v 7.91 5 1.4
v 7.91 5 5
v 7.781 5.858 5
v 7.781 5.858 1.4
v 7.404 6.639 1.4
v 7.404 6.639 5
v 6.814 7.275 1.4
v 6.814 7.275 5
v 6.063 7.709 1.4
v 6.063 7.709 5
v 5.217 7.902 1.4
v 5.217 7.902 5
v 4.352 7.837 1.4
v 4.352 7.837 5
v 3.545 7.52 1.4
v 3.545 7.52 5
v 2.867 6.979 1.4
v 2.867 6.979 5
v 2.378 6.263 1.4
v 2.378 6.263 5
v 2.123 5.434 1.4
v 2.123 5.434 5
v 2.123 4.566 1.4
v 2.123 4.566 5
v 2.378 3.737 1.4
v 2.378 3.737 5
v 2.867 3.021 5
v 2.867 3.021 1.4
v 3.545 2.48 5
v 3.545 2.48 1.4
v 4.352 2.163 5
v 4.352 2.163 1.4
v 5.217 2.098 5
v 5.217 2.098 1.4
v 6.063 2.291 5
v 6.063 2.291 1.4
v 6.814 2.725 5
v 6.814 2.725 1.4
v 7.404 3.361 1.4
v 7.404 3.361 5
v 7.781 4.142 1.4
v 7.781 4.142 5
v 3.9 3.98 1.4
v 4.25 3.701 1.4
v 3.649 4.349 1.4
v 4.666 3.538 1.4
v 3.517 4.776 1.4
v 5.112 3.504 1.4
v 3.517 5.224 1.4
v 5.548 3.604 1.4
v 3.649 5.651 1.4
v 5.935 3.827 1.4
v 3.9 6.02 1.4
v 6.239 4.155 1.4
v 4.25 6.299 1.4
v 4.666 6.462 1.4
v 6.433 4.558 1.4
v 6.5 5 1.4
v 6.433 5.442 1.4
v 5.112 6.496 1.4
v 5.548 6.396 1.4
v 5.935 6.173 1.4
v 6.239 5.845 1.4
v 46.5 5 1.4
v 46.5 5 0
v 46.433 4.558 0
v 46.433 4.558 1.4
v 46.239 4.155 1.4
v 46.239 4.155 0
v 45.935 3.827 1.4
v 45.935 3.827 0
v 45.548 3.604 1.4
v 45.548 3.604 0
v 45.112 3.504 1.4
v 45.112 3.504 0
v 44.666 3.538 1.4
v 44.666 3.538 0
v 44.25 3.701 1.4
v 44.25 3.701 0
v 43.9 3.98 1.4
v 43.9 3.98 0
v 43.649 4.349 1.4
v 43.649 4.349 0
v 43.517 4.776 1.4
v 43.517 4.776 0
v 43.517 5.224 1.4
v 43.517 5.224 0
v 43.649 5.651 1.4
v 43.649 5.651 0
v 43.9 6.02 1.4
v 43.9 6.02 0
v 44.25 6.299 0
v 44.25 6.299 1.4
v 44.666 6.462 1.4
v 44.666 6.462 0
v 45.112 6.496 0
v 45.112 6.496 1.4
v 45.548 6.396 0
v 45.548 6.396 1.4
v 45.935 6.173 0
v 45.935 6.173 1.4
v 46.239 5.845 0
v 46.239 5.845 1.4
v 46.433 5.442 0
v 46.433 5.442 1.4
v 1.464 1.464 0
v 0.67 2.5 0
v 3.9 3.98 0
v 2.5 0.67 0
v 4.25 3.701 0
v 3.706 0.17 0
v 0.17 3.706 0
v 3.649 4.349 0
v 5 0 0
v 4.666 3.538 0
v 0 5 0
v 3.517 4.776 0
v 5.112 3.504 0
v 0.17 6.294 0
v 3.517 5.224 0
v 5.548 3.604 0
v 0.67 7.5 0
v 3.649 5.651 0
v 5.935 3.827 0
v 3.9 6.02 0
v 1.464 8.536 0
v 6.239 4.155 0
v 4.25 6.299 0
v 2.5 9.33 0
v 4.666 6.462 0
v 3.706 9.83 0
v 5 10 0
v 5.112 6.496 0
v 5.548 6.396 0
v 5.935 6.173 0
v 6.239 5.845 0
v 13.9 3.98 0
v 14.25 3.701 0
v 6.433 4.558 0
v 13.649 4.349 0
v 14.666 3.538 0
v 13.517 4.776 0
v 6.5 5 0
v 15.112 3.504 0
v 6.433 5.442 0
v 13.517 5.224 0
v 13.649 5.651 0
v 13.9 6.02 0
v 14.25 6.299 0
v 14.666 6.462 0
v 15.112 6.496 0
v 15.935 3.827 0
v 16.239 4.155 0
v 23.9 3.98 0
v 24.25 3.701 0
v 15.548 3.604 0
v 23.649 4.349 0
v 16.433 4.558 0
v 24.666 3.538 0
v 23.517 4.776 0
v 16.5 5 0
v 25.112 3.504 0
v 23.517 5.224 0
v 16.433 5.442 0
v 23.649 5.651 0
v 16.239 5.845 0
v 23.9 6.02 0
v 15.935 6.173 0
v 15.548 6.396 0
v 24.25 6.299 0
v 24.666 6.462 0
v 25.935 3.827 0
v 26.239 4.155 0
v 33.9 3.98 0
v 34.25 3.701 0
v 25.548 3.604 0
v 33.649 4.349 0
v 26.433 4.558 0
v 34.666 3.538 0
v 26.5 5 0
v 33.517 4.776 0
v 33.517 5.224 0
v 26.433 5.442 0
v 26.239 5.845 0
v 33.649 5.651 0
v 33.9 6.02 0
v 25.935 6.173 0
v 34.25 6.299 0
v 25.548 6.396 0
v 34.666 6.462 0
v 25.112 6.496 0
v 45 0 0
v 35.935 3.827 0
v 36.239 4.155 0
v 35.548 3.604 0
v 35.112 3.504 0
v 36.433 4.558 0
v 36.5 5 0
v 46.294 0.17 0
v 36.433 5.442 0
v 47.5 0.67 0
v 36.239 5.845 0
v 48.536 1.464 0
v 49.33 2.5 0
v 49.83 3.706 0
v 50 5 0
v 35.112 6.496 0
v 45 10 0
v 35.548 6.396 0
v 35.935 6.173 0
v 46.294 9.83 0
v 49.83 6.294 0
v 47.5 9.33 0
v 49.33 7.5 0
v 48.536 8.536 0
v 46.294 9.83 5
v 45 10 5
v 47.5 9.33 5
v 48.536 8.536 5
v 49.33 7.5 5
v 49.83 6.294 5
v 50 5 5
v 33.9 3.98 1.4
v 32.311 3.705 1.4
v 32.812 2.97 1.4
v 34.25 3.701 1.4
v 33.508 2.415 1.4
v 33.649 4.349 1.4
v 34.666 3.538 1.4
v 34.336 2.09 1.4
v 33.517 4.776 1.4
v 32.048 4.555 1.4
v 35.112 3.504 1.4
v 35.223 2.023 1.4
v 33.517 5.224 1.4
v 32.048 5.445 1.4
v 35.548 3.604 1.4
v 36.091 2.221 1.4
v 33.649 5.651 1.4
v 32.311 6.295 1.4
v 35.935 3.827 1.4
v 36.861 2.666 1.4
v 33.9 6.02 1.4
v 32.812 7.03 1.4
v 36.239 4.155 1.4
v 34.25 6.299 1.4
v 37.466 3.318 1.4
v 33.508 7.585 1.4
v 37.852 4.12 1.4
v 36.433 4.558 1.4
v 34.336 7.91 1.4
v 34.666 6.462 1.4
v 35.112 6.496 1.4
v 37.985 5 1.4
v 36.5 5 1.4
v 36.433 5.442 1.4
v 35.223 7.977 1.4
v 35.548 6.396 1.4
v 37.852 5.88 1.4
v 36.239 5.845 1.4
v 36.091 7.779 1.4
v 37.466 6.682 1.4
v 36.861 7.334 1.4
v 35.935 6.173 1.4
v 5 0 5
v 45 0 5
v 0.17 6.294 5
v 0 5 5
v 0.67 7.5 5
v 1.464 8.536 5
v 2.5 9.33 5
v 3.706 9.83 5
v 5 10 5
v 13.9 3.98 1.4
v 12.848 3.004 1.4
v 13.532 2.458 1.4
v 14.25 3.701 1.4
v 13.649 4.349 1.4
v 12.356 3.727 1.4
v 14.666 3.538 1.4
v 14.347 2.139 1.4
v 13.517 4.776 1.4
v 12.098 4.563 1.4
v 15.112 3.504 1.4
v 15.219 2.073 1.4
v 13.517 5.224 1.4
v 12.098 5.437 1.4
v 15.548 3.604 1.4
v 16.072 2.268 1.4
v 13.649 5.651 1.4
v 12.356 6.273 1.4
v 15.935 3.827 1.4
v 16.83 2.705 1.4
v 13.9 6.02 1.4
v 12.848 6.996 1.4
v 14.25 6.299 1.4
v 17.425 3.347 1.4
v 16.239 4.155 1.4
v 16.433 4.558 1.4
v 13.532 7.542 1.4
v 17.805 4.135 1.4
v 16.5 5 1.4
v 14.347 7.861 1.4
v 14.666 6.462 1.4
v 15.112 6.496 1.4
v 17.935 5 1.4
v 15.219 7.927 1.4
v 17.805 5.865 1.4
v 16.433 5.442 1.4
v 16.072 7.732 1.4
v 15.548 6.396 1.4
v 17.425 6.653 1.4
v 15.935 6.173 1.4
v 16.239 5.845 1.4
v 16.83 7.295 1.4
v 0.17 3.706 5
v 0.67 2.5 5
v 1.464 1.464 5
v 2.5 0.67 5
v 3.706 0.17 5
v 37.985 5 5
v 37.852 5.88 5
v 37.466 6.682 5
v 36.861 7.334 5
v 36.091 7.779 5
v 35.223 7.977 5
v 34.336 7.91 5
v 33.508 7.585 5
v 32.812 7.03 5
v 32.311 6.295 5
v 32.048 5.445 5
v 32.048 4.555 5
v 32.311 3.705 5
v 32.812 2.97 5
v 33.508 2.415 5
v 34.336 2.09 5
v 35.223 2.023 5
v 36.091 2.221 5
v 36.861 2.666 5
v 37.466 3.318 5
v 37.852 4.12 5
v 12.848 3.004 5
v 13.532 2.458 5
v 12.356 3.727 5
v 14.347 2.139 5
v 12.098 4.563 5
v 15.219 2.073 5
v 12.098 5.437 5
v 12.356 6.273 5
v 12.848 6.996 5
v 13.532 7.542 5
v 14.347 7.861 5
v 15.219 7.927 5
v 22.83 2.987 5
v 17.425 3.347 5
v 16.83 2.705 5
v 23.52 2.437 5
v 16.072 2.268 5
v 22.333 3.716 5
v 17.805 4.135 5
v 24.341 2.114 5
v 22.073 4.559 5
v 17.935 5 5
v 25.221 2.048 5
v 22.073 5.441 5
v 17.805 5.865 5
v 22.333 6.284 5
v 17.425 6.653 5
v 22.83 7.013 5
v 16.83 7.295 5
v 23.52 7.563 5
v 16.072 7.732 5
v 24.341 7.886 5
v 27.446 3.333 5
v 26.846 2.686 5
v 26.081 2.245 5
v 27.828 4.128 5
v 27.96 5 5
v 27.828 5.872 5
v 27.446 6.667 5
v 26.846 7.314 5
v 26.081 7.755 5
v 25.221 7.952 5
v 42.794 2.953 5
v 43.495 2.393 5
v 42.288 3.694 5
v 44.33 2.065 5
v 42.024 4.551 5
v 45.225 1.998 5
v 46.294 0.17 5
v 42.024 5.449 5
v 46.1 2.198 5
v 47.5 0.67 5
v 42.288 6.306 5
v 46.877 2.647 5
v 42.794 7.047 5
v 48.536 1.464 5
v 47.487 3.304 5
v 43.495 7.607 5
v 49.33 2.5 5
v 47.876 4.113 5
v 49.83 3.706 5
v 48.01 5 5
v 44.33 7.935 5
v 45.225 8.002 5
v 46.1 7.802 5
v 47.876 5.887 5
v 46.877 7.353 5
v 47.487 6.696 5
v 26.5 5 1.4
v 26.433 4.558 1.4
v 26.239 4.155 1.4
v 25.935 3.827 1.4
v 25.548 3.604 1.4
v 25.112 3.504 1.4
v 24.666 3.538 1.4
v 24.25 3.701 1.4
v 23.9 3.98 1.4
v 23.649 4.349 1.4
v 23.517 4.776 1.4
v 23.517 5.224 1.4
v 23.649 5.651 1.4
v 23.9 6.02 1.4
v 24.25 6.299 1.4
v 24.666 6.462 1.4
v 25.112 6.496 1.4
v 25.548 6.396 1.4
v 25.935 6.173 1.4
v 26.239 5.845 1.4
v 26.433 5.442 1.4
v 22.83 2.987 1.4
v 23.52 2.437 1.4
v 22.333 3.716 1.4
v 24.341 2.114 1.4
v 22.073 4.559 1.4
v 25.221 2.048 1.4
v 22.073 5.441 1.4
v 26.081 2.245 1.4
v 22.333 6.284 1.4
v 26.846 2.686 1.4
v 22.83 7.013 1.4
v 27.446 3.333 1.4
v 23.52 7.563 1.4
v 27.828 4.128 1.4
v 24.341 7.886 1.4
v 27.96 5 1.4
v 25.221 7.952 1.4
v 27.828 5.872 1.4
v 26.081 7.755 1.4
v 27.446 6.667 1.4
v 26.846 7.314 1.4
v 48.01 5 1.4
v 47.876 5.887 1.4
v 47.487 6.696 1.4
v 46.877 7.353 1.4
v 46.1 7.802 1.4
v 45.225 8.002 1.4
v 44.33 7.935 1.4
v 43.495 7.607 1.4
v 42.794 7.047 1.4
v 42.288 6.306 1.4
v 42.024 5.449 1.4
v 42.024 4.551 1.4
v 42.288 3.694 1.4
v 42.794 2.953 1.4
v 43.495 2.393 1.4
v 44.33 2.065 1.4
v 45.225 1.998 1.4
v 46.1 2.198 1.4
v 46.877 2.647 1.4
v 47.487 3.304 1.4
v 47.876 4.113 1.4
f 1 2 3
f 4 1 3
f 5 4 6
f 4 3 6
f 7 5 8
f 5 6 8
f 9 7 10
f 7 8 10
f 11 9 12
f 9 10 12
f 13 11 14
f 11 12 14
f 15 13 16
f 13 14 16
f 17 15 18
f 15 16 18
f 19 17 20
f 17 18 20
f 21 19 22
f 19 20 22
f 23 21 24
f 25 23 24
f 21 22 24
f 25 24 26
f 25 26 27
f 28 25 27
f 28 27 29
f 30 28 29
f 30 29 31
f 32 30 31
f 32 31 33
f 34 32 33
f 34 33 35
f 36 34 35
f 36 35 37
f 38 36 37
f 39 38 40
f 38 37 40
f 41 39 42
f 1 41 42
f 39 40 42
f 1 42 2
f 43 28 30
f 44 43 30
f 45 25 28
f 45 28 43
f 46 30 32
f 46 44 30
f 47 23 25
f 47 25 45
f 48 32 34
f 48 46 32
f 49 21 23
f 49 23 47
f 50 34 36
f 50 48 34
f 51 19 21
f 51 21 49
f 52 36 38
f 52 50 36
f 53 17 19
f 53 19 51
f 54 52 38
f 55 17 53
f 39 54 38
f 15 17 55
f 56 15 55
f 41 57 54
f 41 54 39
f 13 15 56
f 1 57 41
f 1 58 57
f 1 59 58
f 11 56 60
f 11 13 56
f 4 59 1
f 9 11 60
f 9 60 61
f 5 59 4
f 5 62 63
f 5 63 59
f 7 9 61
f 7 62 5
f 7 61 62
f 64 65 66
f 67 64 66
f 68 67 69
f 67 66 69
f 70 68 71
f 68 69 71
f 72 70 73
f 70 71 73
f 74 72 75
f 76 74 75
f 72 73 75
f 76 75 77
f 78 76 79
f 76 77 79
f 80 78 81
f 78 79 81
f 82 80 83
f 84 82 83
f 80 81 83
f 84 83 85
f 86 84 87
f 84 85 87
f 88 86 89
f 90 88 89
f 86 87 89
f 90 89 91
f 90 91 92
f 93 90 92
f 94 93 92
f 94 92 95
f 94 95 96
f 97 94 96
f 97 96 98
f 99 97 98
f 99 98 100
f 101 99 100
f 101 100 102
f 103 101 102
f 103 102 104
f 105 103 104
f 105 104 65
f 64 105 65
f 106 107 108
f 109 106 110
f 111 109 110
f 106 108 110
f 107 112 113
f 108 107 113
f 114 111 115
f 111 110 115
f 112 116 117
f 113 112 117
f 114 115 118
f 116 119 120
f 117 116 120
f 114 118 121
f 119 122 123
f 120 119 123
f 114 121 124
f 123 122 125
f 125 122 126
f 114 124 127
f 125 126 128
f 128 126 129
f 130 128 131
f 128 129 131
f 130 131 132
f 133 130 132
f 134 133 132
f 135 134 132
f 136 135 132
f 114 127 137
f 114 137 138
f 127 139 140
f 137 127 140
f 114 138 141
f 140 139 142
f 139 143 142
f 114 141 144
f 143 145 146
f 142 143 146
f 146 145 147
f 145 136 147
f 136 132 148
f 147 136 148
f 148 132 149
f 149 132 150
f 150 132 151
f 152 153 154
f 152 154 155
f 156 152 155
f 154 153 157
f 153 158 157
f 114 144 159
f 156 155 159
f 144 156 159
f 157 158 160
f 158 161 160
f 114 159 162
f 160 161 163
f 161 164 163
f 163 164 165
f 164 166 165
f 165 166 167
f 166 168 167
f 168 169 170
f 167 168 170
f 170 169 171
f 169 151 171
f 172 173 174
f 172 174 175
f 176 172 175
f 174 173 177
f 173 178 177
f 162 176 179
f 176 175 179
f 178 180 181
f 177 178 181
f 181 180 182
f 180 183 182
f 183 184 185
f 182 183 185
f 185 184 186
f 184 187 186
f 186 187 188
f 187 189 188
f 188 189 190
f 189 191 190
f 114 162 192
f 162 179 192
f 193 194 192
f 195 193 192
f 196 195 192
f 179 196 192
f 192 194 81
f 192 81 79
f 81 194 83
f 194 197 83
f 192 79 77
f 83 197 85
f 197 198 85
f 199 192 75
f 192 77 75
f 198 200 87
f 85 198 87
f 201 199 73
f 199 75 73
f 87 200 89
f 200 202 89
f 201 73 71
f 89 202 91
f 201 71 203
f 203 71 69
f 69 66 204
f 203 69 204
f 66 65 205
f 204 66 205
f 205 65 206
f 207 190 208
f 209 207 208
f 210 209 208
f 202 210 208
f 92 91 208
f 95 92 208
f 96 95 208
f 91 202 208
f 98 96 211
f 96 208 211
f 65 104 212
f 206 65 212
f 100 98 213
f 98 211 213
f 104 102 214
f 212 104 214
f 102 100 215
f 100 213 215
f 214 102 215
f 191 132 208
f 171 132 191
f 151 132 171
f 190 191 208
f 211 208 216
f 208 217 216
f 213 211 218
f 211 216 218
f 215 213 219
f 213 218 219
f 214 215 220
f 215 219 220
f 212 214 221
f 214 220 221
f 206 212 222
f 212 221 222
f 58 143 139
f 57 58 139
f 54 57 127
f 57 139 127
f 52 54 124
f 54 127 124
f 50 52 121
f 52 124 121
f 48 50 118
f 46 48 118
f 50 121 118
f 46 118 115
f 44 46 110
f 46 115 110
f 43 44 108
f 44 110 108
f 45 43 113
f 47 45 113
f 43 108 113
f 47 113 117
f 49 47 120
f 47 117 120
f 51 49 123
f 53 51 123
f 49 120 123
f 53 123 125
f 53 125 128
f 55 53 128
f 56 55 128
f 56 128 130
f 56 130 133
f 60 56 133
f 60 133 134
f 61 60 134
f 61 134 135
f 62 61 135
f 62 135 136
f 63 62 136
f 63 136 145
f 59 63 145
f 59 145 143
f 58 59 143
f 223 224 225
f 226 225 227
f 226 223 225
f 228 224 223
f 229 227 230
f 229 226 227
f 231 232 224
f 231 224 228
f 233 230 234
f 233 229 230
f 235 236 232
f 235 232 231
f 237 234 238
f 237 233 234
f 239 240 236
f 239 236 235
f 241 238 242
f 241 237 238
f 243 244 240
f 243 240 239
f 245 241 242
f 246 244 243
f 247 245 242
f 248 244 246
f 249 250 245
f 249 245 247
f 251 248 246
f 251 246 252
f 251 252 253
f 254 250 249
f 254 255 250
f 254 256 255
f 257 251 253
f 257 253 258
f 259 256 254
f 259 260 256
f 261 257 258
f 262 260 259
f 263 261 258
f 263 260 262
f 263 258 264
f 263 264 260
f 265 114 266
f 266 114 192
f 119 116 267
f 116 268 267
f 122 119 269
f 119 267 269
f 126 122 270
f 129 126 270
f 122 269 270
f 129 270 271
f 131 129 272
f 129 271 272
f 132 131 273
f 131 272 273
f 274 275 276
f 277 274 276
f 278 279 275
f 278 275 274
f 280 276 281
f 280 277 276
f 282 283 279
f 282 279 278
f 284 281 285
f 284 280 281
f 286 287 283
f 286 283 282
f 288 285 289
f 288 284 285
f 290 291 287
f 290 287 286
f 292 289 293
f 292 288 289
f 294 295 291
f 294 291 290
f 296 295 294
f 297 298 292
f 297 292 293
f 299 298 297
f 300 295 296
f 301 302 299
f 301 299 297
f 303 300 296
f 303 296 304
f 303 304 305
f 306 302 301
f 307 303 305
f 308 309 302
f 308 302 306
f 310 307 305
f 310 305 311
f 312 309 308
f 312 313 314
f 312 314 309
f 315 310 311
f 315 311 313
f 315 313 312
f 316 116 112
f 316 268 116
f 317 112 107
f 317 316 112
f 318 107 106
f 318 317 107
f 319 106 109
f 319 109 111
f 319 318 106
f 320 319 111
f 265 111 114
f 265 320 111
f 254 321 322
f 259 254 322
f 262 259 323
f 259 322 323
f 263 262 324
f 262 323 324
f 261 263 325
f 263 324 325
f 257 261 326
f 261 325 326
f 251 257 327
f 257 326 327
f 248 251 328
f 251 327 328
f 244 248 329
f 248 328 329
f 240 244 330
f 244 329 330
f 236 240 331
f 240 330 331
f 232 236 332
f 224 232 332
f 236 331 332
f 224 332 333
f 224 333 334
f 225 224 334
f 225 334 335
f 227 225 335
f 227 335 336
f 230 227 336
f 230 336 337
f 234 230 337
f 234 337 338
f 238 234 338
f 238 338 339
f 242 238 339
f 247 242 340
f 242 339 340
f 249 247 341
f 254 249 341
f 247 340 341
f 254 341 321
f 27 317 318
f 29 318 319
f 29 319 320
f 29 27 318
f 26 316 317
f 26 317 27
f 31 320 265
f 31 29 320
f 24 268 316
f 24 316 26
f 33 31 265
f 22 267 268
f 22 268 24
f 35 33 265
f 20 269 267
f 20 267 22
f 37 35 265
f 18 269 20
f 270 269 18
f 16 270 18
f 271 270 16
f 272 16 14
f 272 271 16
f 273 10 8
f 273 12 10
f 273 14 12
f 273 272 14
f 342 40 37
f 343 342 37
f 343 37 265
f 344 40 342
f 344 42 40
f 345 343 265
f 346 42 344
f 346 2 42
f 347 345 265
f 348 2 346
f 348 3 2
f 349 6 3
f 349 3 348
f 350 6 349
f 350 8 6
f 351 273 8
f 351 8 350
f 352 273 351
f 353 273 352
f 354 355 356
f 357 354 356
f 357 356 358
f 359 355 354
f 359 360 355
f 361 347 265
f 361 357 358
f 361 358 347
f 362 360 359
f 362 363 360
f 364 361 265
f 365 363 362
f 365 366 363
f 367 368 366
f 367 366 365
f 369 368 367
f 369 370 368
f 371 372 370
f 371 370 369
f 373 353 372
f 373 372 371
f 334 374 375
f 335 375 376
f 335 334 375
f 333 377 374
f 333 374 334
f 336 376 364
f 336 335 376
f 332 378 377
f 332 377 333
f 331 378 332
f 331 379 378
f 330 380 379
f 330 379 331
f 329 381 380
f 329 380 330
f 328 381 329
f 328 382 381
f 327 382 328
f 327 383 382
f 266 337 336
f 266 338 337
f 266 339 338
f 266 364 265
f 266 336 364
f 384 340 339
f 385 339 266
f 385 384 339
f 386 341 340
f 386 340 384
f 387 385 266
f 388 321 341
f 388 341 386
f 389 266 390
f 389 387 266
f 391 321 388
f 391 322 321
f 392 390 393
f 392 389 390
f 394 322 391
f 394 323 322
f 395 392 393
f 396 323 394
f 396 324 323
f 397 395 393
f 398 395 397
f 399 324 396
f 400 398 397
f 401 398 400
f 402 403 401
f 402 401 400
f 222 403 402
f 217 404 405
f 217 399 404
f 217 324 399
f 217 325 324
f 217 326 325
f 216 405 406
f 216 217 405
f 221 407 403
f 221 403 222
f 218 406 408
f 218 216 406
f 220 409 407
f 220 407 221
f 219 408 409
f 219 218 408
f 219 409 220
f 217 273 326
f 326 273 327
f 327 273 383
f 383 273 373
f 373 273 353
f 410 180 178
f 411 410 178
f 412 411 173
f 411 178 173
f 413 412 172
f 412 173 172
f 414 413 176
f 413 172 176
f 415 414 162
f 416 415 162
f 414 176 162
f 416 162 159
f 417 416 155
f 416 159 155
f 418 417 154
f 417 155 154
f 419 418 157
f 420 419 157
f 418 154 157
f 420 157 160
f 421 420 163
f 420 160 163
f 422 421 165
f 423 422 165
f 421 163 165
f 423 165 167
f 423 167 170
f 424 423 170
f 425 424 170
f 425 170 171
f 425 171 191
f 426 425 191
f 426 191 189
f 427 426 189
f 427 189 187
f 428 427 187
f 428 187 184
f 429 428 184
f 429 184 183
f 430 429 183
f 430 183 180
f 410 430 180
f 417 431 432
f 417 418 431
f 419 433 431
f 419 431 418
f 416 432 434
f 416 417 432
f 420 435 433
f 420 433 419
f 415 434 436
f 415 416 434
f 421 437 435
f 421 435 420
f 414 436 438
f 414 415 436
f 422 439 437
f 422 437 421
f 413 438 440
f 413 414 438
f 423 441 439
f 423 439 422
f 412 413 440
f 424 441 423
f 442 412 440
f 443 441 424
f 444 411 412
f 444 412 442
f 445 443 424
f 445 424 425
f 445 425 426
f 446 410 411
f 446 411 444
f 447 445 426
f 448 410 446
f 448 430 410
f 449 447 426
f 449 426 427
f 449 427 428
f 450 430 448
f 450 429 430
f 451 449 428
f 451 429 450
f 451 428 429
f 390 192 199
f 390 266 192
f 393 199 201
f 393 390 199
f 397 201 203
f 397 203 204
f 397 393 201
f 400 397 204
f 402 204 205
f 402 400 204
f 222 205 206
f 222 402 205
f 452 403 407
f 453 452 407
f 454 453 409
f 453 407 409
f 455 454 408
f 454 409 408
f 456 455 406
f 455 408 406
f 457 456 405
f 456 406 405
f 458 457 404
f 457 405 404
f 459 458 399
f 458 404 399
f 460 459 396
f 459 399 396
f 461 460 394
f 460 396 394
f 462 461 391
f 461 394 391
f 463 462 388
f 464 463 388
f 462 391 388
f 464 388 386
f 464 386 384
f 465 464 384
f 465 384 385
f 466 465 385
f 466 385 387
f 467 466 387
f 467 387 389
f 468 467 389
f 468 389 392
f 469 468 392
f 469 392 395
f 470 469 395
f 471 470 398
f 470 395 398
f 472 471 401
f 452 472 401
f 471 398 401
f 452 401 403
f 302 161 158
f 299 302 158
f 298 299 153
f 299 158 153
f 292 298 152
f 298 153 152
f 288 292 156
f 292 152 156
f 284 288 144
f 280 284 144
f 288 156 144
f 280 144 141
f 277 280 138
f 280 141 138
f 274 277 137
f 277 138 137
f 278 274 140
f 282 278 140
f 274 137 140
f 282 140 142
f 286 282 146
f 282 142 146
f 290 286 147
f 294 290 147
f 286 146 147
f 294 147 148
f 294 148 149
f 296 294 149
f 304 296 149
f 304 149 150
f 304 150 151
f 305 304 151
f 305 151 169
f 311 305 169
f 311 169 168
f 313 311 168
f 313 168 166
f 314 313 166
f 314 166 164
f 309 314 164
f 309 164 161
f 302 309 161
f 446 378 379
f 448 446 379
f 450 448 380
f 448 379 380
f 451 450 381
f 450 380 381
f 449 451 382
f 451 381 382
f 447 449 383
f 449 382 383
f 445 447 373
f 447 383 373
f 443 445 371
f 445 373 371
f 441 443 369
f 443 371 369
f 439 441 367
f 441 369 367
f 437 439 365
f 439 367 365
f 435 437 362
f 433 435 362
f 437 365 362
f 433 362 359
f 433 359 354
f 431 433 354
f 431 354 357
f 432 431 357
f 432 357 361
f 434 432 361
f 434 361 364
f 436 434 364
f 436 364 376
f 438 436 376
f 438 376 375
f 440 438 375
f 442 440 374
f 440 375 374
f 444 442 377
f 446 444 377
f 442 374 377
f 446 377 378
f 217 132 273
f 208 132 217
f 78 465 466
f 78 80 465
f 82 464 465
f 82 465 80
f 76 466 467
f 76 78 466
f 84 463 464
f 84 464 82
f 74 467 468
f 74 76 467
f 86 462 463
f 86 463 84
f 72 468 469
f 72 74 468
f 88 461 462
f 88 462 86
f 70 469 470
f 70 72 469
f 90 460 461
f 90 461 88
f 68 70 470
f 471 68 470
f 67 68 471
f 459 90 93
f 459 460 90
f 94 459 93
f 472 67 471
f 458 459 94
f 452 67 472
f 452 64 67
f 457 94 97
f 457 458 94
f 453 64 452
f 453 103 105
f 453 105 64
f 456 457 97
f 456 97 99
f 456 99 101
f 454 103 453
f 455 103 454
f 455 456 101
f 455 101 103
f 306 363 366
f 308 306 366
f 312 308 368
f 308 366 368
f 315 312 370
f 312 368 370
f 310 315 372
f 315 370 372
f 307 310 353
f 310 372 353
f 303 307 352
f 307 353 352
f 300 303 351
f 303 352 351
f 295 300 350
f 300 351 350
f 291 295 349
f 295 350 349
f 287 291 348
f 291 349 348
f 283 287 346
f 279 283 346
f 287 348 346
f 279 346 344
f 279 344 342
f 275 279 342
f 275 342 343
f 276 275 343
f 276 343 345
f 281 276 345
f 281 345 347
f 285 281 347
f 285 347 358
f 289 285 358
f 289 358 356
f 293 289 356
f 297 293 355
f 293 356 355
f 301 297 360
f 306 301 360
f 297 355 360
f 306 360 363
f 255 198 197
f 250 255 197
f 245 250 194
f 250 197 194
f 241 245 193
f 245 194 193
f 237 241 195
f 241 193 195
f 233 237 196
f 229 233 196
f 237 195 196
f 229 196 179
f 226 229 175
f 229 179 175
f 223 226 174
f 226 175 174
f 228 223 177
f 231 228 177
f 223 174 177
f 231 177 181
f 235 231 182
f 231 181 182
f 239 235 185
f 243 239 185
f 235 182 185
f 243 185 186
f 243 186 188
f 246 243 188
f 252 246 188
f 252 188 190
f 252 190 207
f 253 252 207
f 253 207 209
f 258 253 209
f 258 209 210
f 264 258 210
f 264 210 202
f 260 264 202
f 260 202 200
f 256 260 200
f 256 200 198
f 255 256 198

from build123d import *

# Parameters (mm, degrees)
F0_W     = 50
F0_H     = 10
F1_DEPTH = 5
F2_R     = 1.5
F3_DEPTH = 5.001
F5_R     = 4.99999
F4_R     = 2.91
F4_R_2   = 2.935
F4_R_3   = 2.96
F4_R_4   = 2.985
F4_R_5   = 3.01
F6_DEPTH = 3.6


# Not quite as in the source:
# - a fillet or chamfer is up to 0.001 mm smaller than in the source, because OpenCascade refuses the exact size


with BuildPart() as f1:
    # F0 (on Top) → F1 (new body)
    with BuildSketch(Plane.XY):
        with Locations((25, 5)):
            Rectangle(F0_W, F0_H)
    extrude(amount=F1_DEPTH)

    # F2 (on face) → F3 (cut, through all)
    with BuildSketch(Plane(origin=(0, 0, 0), x_dir=(1, 0, 0), z_dir=(0, 0, -1))):
        with Locations((5, -5)):
            Circle(F2_R)
        with Locations((15, -5)):
            Circle(F2_R)
        with Locations((25, -5)):
            Circle(F2_R)
        with Locations((35, -5)):
            Circle(F2_R)
        with Locations((45, -5)):
            Circle(F2_R)
    extrude(amount=-F3_DEPTH, mode=Mode.SUBTRACT)

    # F5 (radius 5 in the source; OpenCascade refuses exactly that, so slightly less here)
    f5_edges = [f1.edges().sort_by_distance(p)[0] for p in [
        (0, 0, 2.5),
        (0, 10, 2.5),
        (50, 0, 2.5),
        (50, 10, 2.5),
    ]]
    fillet(f5_edges, radius=F5_R)

    # F4 (on face) → F6 (cut)
    with BuildSketch(Plane.XY.offset(5)):
        with Locations((5, 5)):
            Circle(F4_R)
        with Locations((15, 5)):
            Circle(F4_R_2)
        with Locations((25, 5)):
            Circle(F4_R_3)
        with Locations((35, 5)):
            Circle(F4_R_4)
        with Locations((45, 5)):
            Circle(F4_R_5)
    extrude(amount=-F6_DEPTH, mode=Mode.SUBTRACT)


solid = f1.part
